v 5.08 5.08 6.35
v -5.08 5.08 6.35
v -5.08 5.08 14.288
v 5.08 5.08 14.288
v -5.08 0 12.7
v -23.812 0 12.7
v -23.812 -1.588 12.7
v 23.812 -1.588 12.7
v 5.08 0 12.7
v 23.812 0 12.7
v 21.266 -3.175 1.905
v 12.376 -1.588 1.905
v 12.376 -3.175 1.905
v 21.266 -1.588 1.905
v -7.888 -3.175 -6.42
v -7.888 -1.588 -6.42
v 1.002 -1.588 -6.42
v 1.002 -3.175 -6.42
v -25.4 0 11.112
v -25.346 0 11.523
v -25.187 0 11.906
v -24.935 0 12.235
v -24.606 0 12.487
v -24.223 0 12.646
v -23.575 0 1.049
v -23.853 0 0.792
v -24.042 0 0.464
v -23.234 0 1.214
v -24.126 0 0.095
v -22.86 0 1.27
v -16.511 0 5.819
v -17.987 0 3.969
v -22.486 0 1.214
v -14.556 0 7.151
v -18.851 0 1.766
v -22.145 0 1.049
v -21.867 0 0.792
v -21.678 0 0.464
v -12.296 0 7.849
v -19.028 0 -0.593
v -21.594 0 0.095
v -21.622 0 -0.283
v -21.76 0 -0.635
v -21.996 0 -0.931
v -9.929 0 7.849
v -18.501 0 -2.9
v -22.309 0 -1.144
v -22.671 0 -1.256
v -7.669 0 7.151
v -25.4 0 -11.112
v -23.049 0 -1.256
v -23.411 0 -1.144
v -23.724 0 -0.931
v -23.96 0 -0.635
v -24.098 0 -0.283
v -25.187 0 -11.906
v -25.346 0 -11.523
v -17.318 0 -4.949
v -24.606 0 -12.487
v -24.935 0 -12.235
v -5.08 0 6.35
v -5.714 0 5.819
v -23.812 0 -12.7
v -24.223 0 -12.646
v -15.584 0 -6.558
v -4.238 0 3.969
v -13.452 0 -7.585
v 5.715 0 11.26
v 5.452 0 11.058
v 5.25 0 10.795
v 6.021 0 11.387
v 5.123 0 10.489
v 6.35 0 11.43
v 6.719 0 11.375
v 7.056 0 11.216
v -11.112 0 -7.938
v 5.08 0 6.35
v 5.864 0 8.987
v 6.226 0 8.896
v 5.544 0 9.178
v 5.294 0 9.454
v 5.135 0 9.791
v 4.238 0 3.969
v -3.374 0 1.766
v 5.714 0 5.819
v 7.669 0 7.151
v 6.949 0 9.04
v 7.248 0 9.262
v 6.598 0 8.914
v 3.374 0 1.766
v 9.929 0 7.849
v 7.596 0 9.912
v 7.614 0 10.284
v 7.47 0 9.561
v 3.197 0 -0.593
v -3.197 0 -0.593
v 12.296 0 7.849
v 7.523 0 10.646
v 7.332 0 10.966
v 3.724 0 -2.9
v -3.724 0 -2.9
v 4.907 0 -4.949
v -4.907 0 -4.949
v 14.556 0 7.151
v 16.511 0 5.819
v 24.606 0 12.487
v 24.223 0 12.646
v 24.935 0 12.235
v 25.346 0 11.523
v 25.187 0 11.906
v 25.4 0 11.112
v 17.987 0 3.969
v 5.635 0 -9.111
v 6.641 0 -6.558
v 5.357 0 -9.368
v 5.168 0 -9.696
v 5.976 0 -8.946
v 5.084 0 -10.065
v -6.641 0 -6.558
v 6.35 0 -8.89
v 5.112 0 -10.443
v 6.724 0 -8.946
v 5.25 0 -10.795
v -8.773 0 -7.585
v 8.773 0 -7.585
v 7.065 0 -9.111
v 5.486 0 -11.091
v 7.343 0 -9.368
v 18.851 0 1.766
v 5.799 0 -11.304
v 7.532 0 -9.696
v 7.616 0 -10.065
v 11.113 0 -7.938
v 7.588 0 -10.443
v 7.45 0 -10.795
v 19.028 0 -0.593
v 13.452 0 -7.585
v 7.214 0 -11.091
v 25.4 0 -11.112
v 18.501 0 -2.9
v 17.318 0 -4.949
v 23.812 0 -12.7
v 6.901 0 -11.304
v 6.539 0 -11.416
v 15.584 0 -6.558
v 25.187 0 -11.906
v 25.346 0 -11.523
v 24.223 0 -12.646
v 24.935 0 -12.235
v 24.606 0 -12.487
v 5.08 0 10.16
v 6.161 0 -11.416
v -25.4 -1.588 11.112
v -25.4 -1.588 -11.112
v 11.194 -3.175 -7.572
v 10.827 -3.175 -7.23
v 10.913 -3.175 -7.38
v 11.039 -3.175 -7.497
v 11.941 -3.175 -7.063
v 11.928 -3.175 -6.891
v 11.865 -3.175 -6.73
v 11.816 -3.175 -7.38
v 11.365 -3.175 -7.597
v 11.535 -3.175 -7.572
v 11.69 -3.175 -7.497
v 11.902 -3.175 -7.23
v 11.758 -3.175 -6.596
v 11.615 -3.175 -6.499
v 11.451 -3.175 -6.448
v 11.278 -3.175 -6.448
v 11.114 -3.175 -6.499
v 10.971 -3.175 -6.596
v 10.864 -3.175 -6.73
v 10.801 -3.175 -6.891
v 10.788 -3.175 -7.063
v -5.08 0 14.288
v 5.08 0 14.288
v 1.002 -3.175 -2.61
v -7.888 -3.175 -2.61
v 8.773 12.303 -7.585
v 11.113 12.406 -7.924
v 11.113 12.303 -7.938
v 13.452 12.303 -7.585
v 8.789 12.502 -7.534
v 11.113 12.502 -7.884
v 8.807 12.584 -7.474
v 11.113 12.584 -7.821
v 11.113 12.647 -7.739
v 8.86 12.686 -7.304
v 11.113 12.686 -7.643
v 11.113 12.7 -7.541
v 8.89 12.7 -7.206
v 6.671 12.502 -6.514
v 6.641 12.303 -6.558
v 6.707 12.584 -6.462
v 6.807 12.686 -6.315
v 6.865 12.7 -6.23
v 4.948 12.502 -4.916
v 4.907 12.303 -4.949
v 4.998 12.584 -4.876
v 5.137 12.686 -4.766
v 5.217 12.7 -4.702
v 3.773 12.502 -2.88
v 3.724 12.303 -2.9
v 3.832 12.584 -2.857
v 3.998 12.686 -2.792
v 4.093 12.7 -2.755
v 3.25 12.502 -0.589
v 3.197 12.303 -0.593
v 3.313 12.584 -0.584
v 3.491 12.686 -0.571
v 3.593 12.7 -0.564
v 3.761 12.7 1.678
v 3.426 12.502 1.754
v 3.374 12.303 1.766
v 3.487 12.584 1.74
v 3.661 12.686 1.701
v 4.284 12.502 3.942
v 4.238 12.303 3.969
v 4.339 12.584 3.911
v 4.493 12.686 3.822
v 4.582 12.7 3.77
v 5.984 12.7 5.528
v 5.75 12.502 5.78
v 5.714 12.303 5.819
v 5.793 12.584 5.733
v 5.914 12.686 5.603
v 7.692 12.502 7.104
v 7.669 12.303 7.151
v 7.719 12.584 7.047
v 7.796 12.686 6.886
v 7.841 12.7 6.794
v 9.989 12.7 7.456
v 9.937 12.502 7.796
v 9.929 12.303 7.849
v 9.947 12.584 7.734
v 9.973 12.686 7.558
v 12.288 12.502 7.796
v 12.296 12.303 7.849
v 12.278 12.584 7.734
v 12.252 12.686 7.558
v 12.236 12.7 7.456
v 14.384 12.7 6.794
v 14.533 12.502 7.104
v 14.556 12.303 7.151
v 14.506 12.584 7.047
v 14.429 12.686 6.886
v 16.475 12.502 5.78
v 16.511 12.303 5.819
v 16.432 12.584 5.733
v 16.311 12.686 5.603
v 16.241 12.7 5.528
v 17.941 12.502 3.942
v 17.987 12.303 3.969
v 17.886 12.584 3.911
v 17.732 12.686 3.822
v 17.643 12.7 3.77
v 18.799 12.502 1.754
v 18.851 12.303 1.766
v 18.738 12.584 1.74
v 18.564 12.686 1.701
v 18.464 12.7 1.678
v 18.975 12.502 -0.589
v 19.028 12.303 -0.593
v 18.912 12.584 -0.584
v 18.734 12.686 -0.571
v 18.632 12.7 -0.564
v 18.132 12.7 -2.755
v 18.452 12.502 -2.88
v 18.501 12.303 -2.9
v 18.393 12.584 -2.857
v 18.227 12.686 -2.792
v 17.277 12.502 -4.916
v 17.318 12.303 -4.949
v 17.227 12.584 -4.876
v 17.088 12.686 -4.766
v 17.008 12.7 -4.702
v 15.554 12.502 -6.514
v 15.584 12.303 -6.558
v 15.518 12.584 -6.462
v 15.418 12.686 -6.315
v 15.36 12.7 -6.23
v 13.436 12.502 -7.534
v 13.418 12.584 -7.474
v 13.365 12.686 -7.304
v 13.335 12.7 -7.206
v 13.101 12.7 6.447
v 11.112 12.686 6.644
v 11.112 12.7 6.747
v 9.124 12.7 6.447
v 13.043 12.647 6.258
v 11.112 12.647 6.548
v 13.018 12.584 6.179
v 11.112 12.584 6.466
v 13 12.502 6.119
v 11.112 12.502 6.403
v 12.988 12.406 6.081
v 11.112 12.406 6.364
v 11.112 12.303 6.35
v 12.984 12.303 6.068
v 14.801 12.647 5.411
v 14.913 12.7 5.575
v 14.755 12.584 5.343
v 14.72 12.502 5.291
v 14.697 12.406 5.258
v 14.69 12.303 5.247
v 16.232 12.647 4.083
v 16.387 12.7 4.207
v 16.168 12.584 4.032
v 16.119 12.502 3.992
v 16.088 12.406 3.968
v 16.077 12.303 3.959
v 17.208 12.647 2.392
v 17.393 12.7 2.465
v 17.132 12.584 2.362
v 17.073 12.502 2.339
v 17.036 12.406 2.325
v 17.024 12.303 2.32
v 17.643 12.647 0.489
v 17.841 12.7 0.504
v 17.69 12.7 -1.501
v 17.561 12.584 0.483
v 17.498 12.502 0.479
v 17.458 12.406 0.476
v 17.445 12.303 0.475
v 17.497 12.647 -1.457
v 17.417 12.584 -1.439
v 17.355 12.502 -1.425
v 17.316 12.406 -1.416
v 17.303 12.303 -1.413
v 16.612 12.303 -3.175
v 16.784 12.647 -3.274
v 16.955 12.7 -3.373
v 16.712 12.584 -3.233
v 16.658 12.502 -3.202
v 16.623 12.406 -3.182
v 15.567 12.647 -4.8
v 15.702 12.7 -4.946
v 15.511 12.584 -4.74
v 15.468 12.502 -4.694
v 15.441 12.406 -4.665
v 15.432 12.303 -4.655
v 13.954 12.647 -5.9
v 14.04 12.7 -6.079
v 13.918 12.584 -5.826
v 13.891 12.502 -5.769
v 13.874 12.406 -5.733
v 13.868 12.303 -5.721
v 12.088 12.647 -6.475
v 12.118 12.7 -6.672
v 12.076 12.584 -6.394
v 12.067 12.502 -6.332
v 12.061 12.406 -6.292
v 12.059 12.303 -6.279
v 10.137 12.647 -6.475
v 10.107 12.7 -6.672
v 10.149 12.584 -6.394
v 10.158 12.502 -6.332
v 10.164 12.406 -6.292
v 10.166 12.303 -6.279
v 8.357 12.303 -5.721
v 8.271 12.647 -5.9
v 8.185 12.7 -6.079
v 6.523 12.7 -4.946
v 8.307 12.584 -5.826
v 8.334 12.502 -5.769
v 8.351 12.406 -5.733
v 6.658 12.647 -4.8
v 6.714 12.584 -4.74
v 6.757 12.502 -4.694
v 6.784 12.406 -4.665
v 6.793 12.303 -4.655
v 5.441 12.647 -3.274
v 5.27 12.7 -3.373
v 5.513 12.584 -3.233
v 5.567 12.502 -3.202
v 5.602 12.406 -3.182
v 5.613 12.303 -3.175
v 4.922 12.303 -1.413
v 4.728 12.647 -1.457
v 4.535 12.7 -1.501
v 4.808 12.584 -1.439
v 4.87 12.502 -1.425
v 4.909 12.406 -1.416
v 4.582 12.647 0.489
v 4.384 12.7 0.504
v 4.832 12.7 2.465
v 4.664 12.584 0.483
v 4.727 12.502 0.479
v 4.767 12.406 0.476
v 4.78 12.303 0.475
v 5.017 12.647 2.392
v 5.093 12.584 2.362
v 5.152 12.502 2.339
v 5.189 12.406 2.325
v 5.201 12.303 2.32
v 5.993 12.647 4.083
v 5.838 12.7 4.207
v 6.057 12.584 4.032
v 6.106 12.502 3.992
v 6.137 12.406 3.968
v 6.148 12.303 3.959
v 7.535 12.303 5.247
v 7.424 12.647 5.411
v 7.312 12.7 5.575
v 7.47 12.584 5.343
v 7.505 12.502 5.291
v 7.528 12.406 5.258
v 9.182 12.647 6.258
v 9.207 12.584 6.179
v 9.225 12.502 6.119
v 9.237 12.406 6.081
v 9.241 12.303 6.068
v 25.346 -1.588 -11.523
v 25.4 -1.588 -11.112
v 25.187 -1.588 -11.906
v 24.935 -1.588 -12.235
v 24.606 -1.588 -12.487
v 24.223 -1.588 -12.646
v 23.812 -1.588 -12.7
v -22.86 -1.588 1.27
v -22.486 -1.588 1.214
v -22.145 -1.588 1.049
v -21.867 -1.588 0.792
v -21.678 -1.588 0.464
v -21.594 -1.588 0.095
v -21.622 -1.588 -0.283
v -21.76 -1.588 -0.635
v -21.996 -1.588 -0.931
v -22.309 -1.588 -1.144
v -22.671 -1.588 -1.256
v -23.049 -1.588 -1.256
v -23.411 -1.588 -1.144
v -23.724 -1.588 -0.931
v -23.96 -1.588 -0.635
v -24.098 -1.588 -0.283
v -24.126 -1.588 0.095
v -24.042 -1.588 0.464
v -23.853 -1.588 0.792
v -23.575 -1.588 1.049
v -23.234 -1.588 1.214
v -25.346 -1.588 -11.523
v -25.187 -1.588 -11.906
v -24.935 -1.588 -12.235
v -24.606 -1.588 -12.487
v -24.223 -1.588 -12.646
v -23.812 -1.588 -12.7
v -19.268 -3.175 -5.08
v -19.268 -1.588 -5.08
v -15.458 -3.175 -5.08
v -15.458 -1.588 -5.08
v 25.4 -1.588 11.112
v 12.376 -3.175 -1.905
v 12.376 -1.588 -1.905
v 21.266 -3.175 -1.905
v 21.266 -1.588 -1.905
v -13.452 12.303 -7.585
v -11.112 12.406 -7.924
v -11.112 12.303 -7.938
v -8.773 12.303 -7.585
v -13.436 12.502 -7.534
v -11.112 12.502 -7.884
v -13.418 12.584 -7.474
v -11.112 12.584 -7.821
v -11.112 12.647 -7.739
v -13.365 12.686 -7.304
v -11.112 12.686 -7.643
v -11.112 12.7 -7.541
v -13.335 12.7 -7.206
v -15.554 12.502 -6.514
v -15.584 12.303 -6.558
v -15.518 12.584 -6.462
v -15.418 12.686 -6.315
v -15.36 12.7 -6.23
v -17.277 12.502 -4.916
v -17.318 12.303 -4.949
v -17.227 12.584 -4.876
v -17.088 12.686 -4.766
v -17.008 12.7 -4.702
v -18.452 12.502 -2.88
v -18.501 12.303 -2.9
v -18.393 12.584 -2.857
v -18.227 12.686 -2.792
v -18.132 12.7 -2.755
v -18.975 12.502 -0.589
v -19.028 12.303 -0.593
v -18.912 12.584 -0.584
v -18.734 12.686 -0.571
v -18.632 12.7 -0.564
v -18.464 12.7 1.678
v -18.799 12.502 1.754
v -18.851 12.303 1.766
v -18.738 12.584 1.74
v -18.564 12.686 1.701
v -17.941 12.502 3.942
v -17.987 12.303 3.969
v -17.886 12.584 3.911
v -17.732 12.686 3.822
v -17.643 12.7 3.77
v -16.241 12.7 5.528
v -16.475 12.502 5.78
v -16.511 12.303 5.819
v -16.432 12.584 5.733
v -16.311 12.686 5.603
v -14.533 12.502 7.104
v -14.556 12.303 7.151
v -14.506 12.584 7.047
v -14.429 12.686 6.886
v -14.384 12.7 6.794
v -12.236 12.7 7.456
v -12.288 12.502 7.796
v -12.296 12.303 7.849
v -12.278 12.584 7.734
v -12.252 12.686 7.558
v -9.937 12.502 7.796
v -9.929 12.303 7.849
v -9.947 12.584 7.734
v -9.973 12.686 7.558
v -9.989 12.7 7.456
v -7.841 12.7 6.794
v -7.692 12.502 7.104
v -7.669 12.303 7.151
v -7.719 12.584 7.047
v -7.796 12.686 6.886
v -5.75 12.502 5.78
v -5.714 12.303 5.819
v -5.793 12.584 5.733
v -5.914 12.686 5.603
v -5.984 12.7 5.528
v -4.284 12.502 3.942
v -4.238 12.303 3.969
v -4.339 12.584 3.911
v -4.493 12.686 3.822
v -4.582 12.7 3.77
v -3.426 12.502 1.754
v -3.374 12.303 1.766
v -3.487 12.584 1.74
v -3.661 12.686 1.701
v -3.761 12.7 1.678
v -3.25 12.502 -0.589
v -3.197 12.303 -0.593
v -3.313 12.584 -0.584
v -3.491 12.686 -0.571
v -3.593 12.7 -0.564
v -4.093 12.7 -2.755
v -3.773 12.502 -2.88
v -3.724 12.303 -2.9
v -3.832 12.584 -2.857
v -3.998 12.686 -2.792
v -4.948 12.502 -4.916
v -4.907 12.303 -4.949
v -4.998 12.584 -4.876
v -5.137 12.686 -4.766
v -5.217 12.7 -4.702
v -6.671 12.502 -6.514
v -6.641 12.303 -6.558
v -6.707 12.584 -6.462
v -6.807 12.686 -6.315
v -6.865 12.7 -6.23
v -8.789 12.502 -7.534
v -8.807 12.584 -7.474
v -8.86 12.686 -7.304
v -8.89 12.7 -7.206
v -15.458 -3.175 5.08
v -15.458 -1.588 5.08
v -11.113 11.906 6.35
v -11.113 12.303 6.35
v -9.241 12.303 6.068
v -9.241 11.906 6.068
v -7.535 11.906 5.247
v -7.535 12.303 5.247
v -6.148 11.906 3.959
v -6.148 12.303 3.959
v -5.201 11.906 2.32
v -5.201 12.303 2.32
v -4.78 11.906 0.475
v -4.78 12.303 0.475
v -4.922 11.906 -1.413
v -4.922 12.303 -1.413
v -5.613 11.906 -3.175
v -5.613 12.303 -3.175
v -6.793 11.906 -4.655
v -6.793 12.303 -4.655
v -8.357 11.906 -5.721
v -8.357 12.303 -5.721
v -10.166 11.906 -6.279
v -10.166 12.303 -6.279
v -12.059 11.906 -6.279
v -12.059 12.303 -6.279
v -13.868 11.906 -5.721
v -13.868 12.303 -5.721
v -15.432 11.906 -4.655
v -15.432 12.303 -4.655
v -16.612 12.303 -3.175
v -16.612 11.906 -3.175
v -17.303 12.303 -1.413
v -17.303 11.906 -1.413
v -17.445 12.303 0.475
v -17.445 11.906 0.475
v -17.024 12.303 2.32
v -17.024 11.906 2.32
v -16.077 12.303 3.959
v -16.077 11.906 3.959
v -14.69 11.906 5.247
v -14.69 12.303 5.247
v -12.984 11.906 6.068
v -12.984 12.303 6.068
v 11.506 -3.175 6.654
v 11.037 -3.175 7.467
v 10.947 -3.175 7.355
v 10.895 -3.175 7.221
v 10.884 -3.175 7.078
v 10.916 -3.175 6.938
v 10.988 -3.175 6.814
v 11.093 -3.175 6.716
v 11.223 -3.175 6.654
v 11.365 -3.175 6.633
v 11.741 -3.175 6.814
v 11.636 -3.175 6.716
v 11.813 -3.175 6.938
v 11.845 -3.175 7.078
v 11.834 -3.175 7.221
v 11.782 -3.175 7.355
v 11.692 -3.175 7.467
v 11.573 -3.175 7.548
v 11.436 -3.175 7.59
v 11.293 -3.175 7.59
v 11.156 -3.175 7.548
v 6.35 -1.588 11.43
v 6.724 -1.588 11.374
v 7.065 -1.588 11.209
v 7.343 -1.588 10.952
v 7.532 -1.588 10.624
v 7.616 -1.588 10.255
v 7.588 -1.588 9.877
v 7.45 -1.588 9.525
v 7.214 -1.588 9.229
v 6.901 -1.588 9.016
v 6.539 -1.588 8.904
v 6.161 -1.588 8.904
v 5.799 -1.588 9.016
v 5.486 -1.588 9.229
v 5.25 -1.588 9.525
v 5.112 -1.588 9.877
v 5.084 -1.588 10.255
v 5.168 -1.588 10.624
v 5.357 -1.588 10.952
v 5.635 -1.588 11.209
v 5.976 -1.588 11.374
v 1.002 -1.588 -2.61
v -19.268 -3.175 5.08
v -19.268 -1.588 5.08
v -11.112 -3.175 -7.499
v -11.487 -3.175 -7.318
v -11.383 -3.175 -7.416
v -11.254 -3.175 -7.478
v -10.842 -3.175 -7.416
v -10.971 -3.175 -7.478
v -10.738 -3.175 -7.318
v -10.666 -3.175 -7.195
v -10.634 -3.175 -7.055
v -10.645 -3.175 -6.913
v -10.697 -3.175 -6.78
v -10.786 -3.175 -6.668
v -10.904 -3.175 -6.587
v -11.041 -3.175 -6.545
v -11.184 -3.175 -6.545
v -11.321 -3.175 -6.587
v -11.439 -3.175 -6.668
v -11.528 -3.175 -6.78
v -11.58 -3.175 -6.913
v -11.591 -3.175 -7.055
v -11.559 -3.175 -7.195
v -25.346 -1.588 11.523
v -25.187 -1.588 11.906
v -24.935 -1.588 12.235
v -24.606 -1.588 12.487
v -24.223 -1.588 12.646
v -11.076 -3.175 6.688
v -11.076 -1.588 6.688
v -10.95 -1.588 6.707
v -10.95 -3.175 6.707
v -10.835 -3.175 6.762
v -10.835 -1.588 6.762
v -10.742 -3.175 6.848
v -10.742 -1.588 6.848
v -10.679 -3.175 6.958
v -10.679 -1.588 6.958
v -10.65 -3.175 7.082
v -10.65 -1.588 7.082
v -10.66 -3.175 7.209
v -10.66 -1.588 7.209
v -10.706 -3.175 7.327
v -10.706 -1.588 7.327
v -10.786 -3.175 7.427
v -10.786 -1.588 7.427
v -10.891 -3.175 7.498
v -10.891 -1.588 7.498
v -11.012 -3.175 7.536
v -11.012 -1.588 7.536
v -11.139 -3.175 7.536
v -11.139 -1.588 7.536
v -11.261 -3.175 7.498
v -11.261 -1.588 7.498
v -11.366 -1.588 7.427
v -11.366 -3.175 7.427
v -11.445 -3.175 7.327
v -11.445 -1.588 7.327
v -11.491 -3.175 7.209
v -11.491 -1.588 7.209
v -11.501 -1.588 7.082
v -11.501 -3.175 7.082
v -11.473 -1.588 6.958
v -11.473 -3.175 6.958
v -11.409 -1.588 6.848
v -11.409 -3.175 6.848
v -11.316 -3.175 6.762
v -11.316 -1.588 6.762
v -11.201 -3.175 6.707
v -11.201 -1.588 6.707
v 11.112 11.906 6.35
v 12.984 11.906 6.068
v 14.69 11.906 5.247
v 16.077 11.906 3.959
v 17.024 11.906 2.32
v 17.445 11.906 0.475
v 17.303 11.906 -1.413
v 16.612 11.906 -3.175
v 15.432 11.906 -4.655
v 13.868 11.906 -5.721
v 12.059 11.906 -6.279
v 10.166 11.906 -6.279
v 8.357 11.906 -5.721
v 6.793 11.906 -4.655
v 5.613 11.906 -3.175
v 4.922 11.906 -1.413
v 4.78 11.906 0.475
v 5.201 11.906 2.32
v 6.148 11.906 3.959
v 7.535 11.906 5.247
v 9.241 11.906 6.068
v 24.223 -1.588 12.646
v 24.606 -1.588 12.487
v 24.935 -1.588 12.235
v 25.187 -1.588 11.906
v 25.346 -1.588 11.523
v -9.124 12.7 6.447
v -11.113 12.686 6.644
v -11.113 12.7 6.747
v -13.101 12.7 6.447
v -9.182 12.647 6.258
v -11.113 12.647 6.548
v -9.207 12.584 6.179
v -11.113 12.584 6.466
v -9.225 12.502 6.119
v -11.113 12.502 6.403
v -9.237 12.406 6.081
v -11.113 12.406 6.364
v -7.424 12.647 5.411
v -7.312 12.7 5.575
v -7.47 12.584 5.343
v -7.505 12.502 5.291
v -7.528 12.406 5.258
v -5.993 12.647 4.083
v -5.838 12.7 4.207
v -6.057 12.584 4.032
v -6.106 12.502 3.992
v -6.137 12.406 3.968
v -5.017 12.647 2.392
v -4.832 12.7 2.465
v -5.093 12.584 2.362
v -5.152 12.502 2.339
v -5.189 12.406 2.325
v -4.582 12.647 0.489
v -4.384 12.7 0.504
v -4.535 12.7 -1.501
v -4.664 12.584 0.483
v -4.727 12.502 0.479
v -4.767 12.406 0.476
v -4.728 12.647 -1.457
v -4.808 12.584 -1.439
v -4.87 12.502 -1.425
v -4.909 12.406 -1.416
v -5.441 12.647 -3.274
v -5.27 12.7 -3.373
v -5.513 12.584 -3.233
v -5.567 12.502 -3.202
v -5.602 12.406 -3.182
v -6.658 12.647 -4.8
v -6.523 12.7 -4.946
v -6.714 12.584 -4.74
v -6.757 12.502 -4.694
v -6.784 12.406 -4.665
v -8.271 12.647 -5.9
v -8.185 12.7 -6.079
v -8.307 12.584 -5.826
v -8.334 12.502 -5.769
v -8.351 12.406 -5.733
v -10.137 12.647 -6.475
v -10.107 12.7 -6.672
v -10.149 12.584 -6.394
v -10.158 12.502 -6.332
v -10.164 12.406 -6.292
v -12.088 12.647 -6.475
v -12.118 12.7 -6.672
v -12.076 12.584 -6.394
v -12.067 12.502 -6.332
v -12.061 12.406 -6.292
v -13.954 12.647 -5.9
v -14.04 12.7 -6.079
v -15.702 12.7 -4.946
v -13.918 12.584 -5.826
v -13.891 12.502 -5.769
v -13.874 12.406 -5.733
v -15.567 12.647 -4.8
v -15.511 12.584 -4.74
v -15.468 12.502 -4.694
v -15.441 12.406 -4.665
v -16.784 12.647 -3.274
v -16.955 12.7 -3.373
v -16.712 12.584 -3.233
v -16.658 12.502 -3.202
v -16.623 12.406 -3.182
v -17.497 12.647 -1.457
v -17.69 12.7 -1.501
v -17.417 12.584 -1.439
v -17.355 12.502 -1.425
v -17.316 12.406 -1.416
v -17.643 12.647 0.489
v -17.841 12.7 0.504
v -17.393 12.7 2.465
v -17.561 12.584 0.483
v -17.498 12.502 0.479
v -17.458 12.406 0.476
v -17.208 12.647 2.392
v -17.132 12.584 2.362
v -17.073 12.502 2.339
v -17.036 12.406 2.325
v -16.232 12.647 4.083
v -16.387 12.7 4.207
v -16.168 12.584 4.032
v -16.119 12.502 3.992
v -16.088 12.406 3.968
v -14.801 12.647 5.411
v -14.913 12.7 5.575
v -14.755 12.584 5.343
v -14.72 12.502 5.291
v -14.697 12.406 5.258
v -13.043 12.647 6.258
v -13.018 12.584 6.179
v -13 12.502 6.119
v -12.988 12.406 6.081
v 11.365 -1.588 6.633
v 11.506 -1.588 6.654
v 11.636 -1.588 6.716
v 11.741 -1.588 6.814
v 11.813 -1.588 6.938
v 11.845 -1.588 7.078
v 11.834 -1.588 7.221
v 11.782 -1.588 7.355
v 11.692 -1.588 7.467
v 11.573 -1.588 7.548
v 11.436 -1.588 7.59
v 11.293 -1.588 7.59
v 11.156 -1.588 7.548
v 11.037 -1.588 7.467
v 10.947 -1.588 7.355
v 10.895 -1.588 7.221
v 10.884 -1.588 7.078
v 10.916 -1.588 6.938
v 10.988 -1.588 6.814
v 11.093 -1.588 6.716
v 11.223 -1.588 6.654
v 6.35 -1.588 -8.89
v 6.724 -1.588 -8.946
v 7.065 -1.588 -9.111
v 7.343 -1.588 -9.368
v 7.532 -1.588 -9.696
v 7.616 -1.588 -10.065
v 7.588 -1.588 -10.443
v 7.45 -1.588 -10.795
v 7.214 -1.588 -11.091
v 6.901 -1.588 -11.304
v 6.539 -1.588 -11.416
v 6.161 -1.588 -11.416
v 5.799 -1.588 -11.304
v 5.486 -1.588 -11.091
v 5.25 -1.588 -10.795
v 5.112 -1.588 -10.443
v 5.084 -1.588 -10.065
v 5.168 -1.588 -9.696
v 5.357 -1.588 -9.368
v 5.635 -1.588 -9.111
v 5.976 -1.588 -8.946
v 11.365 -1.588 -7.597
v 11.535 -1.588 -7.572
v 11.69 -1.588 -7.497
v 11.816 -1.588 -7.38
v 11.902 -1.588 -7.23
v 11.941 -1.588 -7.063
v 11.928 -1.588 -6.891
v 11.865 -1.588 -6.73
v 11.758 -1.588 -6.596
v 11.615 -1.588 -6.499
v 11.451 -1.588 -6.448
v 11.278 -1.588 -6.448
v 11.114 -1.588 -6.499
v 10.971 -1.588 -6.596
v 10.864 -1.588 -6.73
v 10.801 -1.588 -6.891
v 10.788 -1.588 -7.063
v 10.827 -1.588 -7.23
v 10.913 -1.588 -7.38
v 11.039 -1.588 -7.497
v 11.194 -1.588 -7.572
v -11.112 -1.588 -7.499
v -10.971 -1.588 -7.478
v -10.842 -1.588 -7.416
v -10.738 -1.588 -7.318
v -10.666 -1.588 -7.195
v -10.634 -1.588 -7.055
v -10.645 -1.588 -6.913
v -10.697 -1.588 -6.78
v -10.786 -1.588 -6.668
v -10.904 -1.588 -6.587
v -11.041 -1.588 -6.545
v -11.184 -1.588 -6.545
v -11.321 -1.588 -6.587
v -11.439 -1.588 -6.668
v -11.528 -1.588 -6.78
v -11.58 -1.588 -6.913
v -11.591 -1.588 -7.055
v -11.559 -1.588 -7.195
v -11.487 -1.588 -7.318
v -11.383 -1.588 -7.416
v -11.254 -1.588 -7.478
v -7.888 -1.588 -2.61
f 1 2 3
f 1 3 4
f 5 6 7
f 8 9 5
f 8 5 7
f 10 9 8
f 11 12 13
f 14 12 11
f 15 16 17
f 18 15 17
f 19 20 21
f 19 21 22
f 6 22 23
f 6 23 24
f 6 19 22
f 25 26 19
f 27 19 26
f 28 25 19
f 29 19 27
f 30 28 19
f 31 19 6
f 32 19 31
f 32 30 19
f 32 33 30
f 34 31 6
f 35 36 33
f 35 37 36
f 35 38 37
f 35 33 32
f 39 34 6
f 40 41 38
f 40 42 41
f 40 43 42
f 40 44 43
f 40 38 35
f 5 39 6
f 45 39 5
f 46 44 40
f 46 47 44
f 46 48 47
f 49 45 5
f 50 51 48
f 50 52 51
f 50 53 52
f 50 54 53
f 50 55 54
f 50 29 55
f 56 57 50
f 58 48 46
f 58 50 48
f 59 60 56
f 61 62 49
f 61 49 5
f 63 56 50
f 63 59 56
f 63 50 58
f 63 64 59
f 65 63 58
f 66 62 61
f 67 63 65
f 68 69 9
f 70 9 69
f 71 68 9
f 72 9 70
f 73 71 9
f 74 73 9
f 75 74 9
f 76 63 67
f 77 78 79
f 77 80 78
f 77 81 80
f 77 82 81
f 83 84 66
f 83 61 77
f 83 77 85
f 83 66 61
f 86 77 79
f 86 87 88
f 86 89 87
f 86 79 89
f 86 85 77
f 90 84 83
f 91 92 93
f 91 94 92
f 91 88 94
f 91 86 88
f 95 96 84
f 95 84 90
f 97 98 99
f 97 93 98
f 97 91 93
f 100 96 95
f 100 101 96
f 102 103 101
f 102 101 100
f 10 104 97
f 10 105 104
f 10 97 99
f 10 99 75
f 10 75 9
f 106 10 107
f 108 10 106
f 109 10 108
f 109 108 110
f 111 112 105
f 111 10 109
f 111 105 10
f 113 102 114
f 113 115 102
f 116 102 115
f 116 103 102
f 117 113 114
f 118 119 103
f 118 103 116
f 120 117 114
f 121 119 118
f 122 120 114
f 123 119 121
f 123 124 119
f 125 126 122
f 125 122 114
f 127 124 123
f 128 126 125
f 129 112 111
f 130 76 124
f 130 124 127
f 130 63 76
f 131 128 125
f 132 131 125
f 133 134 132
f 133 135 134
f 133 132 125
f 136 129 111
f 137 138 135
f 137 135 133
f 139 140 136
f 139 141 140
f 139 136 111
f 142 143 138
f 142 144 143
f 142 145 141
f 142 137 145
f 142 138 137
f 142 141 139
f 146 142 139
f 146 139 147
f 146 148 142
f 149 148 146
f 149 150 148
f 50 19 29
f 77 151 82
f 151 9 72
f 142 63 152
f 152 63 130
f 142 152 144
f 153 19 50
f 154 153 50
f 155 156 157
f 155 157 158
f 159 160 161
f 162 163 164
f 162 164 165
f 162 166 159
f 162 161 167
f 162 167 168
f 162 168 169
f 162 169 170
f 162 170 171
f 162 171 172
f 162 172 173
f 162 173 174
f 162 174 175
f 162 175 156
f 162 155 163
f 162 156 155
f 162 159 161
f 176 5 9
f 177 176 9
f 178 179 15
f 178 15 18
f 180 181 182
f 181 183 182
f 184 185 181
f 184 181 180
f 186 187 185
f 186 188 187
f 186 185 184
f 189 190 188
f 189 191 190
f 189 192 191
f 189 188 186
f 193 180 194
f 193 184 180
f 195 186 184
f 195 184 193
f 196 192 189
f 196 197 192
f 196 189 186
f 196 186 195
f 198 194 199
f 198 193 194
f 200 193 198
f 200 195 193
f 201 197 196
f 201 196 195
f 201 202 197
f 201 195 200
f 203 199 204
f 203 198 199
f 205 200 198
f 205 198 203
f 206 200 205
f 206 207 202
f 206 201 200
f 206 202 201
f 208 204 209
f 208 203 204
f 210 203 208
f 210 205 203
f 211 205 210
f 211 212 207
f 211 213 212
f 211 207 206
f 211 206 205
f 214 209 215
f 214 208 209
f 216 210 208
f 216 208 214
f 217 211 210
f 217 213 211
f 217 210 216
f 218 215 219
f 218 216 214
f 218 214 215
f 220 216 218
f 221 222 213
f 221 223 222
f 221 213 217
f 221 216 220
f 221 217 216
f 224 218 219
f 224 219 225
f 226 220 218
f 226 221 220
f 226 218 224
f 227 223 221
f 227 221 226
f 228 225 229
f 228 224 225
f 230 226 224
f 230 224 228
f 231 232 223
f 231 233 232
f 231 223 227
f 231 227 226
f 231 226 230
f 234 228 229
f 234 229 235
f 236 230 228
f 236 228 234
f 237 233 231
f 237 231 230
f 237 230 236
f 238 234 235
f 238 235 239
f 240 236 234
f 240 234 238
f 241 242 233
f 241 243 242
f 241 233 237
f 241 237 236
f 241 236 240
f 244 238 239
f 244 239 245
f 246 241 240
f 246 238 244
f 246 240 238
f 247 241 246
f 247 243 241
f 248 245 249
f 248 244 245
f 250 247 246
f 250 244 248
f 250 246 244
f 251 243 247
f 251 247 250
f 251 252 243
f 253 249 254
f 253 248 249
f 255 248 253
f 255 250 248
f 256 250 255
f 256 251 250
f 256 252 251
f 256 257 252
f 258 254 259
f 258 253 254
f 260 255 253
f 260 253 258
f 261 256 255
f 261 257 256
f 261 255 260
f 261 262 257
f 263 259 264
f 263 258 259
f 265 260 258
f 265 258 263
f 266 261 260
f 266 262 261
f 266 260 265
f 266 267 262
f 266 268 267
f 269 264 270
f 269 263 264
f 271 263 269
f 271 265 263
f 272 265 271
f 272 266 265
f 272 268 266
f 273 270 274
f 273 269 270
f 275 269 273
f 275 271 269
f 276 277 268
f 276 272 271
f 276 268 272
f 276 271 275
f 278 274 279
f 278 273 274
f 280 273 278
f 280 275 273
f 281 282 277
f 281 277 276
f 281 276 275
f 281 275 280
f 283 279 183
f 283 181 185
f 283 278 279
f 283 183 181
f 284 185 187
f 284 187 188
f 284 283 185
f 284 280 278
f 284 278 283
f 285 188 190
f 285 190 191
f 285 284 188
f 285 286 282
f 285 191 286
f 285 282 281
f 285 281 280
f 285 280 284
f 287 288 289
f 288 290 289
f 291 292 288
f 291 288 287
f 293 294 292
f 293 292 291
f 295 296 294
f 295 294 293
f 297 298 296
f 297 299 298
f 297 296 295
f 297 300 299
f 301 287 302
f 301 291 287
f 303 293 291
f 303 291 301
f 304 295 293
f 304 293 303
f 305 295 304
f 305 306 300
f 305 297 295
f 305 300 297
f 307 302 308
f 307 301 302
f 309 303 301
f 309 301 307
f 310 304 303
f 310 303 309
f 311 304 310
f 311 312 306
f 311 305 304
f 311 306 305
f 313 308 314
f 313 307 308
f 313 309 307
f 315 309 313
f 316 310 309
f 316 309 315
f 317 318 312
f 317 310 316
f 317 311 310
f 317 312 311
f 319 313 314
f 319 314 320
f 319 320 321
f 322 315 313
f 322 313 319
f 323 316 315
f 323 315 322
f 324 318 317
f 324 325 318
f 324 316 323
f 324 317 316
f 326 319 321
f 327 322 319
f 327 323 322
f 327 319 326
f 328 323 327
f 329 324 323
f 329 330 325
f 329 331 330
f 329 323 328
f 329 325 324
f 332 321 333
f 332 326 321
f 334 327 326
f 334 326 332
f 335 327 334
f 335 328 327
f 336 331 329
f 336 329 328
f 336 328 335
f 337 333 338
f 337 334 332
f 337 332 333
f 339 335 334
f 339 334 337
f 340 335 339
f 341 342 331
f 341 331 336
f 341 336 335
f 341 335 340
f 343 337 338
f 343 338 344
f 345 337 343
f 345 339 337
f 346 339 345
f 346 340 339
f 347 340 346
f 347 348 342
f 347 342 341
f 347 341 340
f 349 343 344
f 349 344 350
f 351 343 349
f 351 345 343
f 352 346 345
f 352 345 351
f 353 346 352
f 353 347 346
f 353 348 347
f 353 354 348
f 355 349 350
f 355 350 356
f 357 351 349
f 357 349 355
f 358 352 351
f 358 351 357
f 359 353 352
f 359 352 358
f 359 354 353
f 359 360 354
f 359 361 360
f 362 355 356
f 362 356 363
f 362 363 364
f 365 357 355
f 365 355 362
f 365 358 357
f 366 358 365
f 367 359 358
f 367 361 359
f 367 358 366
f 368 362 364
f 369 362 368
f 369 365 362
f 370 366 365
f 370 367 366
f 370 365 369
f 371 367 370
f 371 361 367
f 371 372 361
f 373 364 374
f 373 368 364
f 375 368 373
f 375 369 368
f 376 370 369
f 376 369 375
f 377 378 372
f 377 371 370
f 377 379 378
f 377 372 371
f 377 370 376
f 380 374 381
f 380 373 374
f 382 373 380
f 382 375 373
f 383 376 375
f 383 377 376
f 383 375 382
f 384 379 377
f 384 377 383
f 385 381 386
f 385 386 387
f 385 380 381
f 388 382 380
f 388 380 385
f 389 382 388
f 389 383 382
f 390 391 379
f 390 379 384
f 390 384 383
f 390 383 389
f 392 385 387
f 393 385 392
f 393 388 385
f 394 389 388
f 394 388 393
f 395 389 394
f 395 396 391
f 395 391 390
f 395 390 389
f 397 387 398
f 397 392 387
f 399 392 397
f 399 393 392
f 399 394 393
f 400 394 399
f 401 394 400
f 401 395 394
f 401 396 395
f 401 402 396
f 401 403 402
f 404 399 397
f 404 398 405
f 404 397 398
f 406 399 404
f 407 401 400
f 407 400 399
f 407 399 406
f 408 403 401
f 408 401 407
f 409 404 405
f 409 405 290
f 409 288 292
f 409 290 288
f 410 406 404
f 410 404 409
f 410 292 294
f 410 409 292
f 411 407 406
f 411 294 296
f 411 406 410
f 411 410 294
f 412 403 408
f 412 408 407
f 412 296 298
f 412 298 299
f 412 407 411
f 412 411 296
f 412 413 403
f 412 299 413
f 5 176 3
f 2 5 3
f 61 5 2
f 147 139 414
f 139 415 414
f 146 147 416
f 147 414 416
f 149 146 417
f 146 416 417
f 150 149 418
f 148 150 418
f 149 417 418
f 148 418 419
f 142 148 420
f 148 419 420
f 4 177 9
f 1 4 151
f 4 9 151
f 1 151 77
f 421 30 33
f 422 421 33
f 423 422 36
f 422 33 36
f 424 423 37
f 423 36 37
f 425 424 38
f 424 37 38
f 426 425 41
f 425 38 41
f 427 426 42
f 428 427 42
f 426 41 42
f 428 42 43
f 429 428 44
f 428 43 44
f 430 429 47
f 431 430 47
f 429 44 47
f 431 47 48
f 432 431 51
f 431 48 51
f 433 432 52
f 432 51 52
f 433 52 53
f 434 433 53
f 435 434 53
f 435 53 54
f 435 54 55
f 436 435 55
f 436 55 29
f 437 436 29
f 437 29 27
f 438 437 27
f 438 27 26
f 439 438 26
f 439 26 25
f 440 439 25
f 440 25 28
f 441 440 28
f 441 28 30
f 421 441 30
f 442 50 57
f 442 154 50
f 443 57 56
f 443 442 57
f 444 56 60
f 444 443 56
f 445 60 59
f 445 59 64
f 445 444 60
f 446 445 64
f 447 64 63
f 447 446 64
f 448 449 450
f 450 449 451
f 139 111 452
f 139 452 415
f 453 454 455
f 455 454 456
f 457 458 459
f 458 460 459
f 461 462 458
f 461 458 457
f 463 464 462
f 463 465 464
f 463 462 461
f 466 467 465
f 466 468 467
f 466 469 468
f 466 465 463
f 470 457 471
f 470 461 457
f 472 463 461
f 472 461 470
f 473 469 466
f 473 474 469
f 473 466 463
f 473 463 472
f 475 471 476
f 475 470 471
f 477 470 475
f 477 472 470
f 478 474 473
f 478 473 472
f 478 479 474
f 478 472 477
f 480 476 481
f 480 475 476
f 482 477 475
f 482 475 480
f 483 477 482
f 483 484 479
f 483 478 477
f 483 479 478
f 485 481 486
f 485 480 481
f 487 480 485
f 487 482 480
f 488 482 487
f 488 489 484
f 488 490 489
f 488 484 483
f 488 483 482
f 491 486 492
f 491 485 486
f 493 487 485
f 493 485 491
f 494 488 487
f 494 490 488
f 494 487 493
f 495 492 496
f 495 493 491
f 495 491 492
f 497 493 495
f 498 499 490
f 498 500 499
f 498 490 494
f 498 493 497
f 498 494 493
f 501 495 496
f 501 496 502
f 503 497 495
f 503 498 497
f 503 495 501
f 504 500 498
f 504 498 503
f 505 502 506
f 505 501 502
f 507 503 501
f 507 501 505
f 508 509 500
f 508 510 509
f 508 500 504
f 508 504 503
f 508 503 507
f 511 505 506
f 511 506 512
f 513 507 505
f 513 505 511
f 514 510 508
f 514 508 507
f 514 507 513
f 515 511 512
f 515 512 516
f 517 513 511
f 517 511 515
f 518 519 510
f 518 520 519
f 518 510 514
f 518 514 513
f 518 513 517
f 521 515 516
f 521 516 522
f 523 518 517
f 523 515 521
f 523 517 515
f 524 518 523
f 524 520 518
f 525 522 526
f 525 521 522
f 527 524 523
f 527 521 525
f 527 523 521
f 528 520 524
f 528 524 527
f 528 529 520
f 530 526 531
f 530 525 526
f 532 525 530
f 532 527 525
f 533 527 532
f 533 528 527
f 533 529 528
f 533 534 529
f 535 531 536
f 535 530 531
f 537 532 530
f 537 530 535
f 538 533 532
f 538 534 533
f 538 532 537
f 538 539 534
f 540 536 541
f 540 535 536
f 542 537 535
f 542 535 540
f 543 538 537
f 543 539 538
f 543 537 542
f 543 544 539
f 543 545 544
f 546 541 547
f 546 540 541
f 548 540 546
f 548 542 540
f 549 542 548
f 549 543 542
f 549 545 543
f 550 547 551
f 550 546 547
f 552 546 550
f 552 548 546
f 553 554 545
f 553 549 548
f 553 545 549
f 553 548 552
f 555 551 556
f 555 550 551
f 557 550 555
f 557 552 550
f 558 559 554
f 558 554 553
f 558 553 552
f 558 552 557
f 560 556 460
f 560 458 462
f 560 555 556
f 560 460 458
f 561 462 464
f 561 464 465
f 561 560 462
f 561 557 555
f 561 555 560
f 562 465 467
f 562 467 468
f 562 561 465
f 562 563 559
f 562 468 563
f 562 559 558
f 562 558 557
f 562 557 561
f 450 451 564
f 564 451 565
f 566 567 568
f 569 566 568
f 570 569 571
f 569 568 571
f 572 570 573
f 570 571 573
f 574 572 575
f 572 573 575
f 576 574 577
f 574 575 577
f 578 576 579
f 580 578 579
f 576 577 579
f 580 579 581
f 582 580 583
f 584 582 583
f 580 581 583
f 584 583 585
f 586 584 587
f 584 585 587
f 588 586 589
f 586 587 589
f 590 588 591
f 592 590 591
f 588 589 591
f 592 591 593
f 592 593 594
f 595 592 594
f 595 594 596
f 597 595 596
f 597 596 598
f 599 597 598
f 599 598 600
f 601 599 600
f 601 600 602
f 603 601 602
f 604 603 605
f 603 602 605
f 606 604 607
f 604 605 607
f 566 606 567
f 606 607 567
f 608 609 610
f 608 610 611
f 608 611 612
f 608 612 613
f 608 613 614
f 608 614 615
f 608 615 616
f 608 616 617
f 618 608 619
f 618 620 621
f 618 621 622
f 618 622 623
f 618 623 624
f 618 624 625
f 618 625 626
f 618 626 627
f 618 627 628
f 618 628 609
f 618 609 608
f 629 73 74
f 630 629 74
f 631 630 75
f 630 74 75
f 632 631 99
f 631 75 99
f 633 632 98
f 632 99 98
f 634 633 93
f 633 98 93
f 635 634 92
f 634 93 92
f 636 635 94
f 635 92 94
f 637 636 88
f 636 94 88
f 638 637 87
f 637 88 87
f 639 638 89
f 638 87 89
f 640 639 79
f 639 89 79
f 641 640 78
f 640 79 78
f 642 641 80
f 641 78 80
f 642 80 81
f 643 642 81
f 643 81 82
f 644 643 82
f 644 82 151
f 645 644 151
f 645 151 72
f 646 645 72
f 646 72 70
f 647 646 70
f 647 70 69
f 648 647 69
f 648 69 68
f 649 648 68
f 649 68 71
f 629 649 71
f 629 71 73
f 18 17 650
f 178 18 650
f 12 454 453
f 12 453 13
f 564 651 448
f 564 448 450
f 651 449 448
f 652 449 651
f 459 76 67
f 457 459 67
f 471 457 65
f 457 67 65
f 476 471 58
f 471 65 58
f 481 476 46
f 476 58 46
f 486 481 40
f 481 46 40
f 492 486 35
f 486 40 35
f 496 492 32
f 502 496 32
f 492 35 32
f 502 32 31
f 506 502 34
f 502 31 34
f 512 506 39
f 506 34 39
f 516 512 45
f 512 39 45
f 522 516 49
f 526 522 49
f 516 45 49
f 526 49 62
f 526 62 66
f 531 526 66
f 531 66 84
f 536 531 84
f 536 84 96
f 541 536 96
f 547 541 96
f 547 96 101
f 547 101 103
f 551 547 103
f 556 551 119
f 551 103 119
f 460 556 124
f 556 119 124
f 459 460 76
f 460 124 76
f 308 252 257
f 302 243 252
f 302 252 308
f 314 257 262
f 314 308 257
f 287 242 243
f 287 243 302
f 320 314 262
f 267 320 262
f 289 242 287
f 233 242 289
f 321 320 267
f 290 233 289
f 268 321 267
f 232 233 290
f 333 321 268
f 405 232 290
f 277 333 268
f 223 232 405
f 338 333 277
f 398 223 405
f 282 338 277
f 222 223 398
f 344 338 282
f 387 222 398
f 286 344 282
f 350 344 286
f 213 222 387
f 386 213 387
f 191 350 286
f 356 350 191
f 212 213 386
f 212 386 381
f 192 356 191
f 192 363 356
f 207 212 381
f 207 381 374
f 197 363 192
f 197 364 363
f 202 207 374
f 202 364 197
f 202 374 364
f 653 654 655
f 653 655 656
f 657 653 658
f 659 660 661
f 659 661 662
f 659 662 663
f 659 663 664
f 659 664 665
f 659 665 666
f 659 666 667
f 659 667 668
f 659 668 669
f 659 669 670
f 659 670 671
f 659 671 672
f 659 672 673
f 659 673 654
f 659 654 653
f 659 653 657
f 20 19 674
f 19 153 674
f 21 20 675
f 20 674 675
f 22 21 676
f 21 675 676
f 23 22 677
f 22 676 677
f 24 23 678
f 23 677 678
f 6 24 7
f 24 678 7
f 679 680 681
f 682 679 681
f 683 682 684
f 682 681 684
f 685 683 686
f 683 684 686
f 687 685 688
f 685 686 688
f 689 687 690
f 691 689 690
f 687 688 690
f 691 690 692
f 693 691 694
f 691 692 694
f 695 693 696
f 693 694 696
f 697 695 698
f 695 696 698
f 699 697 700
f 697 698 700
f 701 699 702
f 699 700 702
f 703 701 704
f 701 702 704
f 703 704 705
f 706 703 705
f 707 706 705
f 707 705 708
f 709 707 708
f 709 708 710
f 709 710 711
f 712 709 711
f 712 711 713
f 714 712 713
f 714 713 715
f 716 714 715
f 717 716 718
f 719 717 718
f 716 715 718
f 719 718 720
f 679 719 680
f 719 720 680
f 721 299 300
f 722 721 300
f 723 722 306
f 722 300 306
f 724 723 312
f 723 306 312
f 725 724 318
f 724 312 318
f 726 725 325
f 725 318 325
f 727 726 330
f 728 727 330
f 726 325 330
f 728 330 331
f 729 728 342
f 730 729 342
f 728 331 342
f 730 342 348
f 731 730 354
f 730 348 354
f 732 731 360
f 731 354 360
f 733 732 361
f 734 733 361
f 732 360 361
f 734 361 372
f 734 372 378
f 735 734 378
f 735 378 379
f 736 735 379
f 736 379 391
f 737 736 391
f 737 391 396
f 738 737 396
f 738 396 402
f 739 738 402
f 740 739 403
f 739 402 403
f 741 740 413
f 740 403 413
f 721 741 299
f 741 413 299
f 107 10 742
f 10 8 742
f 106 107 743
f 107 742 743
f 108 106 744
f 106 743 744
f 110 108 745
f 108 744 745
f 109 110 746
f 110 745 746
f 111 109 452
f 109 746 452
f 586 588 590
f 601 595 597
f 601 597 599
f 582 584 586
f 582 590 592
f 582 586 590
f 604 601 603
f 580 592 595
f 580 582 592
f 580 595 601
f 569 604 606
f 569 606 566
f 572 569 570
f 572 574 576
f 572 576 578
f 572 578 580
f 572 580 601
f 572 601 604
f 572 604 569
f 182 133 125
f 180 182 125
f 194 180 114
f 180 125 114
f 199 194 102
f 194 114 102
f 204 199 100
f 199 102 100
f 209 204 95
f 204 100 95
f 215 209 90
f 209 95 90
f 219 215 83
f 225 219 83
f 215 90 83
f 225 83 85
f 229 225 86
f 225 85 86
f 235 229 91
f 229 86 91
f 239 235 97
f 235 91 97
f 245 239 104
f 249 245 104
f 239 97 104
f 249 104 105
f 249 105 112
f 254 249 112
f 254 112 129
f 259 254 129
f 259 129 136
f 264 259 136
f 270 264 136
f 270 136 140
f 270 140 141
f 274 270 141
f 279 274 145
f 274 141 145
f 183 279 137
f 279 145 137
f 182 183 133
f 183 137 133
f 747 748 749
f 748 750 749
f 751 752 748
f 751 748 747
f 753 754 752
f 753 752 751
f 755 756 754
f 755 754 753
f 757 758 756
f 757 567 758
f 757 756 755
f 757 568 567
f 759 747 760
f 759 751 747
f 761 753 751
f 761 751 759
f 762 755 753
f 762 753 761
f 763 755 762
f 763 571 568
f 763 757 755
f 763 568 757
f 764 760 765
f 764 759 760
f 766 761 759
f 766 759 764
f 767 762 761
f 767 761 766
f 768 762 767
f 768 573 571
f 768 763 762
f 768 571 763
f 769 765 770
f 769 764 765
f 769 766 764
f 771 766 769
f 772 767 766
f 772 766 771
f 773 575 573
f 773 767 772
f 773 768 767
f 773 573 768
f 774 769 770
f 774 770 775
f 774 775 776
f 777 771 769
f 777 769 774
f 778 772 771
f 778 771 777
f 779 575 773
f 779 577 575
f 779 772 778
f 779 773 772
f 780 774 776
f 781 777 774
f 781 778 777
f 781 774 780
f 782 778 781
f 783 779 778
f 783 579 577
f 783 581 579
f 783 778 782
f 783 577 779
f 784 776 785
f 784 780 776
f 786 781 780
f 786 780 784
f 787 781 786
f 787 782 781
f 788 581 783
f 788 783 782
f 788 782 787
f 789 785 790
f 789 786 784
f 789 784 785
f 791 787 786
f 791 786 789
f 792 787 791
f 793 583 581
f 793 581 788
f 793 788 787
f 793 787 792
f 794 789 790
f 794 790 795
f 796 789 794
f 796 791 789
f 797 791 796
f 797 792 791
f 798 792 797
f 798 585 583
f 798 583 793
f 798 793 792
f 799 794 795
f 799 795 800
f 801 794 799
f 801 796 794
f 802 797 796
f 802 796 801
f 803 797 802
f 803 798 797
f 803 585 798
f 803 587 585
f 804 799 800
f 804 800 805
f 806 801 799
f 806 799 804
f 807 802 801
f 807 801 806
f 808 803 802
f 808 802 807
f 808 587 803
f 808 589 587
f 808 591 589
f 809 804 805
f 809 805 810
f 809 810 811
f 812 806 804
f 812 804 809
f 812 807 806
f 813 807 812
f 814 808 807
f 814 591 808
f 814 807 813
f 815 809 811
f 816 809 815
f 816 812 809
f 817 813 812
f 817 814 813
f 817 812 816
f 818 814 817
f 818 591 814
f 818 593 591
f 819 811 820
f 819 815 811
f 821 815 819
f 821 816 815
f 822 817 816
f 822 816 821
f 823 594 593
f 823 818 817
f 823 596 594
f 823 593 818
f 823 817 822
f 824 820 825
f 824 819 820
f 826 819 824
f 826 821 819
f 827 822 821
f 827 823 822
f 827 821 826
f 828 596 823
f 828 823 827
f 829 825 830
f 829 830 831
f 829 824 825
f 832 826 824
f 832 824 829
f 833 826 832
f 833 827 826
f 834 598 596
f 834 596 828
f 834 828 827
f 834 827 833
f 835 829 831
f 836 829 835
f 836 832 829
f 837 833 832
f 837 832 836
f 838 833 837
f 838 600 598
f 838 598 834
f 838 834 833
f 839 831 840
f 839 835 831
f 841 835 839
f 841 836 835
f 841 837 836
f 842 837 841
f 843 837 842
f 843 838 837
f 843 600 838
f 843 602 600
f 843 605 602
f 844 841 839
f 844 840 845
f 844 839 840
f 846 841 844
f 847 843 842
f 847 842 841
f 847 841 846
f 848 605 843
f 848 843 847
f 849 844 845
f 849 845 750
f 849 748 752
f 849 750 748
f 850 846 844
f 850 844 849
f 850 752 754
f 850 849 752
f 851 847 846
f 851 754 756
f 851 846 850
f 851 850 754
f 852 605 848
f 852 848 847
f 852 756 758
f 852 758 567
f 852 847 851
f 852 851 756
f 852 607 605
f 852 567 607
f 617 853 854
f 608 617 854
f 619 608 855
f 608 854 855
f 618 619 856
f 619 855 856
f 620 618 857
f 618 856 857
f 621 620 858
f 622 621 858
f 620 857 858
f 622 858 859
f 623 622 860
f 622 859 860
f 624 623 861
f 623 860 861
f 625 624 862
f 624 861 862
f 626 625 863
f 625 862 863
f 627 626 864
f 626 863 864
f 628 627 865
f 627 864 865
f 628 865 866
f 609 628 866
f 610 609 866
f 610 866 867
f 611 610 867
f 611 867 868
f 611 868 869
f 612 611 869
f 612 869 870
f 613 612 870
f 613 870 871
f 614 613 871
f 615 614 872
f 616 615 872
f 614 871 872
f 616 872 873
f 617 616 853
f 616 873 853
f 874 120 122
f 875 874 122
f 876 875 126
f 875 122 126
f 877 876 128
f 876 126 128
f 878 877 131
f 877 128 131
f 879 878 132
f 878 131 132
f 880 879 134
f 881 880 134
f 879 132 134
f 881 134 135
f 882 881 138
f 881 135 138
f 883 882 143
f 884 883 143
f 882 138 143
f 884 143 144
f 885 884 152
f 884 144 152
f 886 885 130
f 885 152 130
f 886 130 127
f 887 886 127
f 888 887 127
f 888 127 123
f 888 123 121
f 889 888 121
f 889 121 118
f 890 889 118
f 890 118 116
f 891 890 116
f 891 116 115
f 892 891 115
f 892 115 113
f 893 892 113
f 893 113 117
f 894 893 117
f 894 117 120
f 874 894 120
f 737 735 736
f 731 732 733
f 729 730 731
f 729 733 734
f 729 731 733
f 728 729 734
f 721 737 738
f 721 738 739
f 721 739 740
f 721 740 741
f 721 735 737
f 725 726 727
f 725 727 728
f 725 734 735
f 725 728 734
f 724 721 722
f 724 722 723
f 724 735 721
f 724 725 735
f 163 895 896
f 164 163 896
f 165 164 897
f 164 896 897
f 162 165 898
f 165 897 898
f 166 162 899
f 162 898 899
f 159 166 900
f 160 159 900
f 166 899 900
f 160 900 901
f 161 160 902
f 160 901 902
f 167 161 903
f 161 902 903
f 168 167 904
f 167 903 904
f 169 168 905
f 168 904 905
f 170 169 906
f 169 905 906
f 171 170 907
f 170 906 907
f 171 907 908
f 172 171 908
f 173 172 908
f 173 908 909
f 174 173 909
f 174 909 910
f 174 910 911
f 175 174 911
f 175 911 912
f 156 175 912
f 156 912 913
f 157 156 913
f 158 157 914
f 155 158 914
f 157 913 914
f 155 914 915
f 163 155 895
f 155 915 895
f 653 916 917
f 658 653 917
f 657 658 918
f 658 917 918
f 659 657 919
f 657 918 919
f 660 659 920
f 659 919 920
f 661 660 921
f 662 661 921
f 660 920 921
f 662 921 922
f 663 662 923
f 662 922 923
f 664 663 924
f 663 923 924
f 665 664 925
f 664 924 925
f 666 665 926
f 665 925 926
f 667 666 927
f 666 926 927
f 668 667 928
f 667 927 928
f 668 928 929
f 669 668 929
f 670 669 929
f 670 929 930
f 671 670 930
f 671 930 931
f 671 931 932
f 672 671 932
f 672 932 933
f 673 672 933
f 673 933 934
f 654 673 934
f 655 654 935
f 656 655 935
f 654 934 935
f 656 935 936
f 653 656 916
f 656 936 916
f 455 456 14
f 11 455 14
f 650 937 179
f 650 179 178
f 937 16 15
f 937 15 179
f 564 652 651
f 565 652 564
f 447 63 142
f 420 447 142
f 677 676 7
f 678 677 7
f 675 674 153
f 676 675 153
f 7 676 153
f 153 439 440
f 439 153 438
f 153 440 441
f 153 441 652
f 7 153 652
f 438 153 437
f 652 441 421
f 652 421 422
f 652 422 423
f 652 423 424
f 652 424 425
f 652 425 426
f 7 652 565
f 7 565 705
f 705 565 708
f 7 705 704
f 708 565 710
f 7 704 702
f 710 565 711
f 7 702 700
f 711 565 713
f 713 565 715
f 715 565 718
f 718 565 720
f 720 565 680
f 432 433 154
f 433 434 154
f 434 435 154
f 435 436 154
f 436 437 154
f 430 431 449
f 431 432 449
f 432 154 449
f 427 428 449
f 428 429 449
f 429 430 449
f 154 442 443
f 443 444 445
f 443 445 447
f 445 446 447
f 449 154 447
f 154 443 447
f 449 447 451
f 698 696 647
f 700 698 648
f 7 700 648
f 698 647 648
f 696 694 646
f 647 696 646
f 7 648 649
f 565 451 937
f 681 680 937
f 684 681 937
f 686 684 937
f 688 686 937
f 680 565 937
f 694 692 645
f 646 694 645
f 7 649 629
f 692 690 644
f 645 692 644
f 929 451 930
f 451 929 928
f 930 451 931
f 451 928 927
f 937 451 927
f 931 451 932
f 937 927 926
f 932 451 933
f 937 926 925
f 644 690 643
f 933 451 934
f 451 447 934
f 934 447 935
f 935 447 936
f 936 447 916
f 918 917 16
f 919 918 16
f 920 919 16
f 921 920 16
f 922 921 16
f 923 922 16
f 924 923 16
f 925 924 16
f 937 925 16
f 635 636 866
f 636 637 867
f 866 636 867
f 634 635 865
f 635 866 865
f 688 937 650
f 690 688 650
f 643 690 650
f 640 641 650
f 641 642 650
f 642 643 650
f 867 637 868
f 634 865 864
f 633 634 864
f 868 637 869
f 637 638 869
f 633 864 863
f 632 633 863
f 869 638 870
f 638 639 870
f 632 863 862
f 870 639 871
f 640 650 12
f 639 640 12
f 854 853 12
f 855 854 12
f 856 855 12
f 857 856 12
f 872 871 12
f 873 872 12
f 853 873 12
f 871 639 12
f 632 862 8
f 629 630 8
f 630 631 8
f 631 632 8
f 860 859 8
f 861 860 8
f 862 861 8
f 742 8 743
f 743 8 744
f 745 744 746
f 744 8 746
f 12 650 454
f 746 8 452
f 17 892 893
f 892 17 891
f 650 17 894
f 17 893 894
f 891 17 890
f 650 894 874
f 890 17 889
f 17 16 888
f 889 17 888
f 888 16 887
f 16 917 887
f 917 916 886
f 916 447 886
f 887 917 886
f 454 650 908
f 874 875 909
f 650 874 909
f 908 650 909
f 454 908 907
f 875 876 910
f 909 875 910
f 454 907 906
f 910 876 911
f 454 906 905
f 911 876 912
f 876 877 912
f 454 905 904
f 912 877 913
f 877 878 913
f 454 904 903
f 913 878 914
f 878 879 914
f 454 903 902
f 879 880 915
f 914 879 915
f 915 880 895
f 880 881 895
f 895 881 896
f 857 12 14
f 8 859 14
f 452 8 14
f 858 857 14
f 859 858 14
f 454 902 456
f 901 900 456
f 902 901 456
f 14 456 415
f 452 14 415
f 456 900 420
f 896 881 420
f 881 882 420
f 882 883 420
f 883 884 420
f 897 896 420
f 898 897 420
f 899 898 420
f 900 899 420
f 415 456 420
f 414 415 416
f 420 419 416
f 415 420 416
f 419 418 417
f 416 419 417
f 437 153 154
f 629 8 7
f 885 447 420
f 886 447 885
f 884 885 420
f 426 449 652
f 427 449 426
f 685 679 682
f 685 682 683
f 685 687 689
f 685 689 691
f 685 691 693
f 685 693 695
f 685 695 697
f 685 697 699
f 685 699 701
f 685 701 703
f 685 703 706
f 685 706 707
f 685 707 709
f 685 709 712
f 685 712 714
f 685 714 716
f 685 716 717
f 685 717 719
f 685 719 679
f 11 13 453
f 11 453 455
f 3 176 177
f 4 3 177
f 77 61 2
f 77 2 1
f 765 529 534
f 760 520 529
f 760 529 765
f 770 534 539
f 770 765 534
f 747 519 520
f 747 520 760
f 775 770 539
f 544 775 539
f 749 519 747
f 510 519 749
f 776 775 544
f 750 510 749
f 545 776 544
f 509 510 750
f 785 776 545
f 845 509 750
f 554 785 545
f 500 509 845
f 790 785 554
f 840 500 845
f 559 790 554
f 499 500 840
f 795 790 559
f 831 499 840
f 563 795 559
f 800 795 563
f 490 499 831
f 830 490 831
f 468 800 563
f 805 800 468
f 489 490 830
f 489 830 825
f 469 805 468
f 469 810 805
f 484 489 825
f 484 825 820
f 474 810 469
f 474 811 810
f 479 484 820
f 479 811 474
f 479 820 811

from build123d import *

# Parameters (mm, degrees)
SKETCH5_W           = 50.8
SKETCH5_H           = 25.4
BOSS_EXTRUDE4_DEPTH = 1.5875
FILLET1_R           = 1.5875
SKETCH6_R           = 1.27
CUT_EXTRUDE1_DEPTH  = 29.442400677
SKETCH7_R           = 7.9375
BOSS_EXTRUDE5_DEPTH = 12.7
SKETCH8_R           = 6.35
CUT_EXTRUDE2_DEPTH  = 0.79375
FILLET2_R           = 0.396875
SKETCH9_W           = 10.16
SKETCH9_H           = 7.9375
BOSS_EXTRUDE6_DEPTH = 5.08
SKETCH10_R          = 0.426470585
SKETCH10_R_2        = 0.479624958
SKETCH10_R_3        = 0.577856792
SKETCH10_R_4        = 0.481547326
SKETCH10_W          = 3.81
SKETCH10_H          = 10.16
SKETCH10_W_2        = 8.89
SKETCH10_H_2        = 3.81
BOSS_EXTRUDE7_DEPTH = 1.5875


with BuildPart() as part:
    # Sketch5 → Boss-Extrude4 (new body)
    with BuildSketch(Plane(origin=(0, 0, 0), x_dir=(1, 0, 0), z_dir=(0, 1, 0))):
        Rectangle(SKETCH5_W, SKETCH5_H)
    extrude(amount=-BOSS_EXTRUDE4_DEPTH)

    # Fillet1
    fillet1_edges = [part.edges().sort_by_distance(p)[0] for p in [
        (25.4, -0.79375, 12.7),
        (-25.4, -0.79375, 12.7),
        (-25.4, -0.79375, -12.7),
        (25.4, -0.79375, -12.7),
    ]]
    fillet(fillet1_edges, radius=FILLET1_R)

    # Sketch6 → Cut-Extrude1 (cut, through all)
    with BuildSketch(Plane(origin=(0, 0, 0), x_dir=(1, 0, 0), z_dir=(0, 1, 0))):
        with Locations(Location((-22.86, 0, 0), (0, 0, 270))):
            Circle(SKETCH6_R)
        with Locations(Location((6.35, 10.16, 0), (0, 0, 270))):
            Circle(SKETCH6_R)
        with Locations(Location((6.35, -10.16, 0), (0, 0, 270))):
            Circle(SKETCH6_R)
    extrude(amount=-CUT_EXTRUDE1_DEPTH, mode=Mode.SUBTRACT)

    # Sketch7 → Boss-Extrude5 (add)
    with BuildSketch(Plane(origin=(0, 0, 0), x_dir=(1, 0, 0), z_dir=(0, 1, 0))):
        with Locations(Location((11.1125, 0, 0), (0, 0, 90))):
            Circle(SKETCH7_R)
        with Locations(Location((-11.1125, 0, 0), (0, 0, 90))):
            Circle(SKETCH7_R)
    extrude(amount=BOSS_EXTRUDE5_DEPTH)

    # Sketch8 → Cut-Extrude2 (cut)
    with BuildSketch(Plane(origin=(0, 12.7, 0), x_dir=(1, 0, 0), z_dir=(0, 1, 0))):
        with Locations(Location((-11.1125, 0, 0), (0, 0, 270))):
            Circle(SKETCH8_R)
        with Locations(Location((11.1125, 0, 0), (0, 0, 270))):
            Circle(SKETCH8_R)
    extrude(amount=-CUT_EXTRUDE2_DEPTH, mode=Mode.SUBTRACT)

    # Fillet2
    fillet2_edges = [part.edges().sort_by_distance(p)[0] for p in [
        (11.1125, 12.7, 7.9375),
        (-11.1125, 12.7, 7.9375),
        (-11.1125, 12.7, -6.35),
        (11.1125, 12.7, -6.35),
    ]]
    fillet(fillet2_edges, radius=FILLET2_R)

    # Sketch9 → Boss-Extrude6 (add)
    with BuildSketch(Plane(origin=(0, 0, 0), x_dir=(1, 0, 0), z_dir=(0, 1, 0))):
        with Locations((0, -10.31875)):
            Rectangle(SKETCH9_W, SKETCH9_H)
    extrude(amount=BOSS_EXTRUDE6_DEPTH)

    # Sketch10 → Boss-Extrude7 (add)
    with BuildSketch(Plane.XZ.offset(1.5875)):
        with Locations(Location((-11.075588504, 7.114058657, 0), (0, 0, 270))):
            Circle(SKETCH10_R)
        with Locations(Location((-11.1125, -7.019355369, 0), (0, 0, 270))):
            Circle(SKETCH10_R_2)
        with Locations(Location((11.3645169, -7.019355369, 0), (0, 0, 270))):
            Circle(SKETCH10_R_3)
        with Locations(Location((11.3645169, 7.114058657, 0), (0, 0, 270))):
            Circle(SKETCH10_R_4)
        with Locations((-17.362669173, 0)):
            Rectangle(SKETCH10_W, SKETCH10_H)
        with Locations((16.820766285, 0)):
            Rectangle(SKETCH10_W_2, SKETCH10_H_2)
        with Locations((-3.443063383, -4.515309272)):
            Rectangle(SKETCH10_W_2, SKETCH10_H_2)
    extrude(amount=BOSS_EXTRUDE7_DEPTH)


solid = part.part
